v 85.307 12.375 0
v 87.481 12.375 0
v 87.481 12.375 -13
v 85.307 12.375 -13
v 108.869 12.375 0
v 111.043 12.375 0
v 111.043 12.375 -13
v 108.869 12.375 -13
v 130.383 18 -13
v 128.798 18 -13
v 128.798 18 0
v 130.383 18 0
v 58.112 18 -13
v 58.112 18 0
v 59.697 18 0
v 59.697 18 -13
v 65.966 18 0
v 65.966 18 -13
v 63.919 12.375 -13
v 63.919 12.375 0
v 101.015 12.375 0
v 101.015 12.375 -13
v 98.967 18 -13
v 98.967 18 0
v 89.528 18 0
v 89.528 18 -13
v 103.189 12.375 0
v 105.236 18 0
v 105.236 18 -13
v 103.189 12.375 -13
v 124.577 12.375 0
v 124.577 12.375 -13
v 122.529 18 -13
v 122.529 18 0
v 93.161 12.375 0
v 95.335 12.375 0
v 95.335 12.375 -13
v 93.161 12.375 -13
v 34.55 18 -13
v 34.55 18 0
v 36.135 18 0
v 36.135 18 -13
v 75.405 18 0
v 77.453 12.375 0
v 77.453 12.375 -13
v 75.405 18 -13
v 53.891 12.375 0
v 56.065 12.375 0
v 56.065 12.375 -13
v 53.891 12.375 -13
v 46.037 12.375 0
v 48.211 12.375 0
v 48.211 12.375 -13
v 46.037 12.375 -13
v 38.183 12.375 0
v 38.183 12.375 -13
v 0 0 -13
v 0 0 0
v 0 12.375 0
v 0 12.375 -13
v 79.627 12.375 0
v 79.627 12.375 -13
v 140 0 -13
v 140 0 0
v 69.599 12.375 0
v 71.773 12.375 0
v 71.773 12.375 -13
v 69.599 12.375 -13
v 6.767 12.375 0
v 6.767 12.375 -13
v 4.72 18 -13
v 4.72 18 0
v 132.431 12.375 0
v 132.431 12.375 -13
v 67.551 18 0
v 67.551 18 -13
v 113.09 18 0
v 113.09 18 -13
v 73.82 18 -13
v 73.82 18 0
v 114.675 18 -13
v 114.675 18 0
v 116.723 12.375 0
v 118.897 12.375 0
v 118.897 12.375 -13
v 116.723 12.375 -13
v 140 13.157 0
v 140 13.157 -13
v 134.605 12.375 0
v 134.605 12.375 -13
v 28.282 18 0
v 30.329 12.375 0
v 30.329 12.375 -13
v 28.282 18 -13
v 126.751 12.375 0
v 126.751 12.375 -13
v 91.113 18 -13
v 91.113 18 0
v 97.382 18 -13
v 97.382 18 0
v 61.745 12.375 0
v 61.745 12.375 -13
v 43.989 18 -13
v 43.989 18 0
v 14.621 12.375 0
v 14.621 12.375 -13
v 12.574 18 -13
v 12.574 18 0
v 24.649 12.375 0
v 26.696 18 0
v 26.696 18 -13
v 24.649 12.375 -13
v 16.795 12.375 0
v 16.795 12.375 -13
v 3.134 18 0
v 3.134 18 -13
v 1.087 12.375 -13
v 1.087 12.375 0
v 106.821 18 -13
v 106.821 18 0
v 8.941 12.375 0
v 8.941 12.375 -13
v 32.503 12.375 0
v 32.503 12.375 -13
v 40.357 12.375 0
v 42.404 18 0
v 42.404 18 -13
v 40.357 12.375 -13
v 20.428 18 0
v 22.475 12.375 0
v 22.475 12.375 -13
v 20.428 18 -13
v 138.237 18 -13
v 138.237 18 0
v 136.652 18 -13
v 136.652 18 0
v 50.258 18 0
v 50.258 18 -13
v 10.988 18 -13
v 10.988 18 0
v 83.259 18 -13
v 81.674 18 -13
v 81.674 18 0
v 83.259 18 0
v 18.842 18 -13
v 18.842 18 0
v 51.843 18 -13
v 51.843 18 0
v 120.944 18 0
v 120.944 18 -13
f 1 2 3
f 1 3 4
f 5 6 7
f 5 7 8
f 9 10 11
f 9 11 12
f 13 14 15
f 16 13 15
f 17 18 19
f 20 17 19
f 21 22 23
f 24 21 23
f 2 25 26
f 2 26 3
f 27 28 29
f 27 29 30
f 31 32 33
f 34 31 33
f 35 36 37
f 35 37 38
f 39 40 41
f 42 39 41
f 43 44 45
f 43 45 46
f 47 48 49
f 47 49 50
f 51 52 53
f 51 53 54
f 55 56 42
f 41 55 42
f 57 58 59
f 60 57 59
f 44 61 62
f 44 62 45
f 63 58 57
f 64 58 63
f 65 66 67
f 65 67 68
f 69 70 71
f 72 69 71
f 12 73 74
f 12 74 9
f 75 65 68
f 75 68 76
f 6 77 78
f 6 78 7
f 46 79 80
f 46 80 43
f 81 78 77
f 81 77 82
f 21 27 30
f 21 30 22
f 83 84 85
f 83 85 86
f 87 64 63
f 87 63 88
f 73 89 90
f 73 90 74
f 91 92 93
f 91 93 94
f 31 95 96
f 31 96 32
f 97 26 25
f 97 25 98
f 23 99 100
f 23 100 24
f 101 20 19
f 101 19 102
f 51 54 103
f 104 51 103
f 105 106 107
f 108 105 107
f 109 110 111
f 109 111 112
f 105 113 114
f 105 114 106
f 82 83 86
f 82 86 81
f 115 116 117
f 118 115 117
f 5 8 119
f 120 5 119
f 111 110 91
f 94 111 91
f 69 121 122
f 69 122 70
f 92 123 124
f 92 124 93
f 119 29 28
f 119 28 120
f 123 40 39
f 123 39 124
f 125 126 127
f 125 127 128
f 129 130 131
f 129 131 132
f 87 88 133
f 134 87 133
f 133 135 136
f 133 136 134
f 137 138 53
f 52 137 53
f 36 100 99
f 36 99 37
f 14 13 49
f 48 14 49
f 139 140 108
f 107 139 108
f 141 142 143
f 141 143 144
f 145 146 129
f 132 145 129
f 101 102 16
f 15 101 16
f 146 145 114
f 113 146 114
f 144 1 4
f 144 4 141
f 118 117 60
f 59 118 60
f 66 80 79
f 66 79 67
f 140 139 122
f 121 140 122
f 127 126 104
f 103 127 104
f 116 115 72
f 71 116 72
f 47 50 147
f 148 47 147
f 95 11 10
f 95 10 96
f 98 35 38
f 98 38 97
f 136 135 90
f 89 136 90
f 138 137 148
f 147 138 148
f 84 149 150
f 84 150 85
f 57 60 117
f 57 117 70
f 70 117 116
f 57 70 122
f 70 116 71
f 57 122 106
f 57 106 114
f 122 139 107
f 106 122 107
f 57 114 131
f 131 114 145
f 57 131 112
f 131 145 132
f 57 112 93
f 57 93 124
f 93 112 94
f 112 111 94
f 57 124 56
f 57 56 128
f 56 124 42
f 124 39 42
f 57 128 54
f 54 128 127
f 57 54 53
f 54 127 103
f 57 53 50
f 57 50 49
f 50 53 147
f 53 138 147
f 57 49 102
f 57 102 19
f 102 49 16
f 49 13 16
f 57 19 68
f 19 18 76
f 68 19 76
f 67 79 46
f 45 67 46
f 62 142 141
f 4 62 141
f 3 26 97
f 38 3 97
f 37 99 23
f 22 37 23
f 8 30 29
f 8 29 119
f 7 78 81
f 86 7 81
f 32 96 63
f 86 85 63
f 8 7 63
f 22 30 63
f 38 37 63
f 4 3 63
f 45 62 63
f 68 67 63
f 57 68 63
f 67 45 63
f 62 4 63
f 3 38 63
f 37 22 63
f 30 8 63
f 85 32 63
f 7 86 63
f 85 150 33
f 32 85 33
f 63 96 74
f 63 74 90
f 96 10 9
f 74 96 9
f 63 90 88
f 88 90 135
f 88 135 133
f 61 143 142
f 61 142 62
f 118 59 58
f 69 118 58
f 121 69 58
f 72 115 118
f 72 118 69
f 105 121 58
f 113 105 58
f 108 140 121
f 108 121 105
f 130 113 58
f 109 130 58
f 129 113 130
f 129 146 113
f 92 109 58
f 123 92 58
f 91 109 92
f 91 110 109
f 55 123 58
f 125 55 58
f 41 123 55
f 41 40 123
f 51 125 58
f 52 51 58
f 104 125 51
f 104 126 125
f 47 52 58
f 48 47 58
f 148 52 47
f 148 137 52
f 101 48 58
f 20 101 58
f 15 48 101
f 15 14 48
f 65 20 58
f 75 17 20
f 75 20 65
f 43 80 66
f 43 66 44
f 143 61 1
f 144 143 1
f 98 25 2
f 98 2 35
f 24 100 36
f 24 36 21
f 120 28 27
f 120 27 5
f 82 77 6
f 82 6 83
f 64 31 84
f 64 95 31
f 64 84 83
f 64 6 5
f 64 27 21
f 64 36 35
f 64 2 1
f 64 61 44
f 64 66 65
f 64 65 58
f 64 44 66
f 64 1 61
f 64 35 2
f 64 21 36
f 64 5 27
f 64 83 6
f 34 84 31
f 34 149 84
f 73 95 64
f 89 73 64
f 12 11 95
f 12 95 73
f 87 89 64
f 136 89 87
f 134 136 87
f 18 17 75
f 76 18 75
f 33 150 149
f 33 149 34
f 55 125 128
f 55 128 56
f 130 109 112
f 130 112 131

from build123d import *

# Parameters (mm, degrees)
BLANKSKE_W         = 140
BLANKSKE_H         = 18
BLANK_DEPTH        = 15
TOOTHCUTSIM_DEPTH  = 142.947173272
TEETHCUTS_COUNT    = 19
TEETHCUTS_PITCH    = 7.853981625
SKETCH1_W          = 155.727496732
SKETCH1_H          = 72.883147076
CUT_EXTRUDE2_DEPTH = 2


with BuildPart() as part:
    # BlankSke → Blank (new body)
    with BuildSketch(Plane.XY):
        with Locations((70, 9)):
            Rectangle(BLANKSKE_W, BLANKSKE_H)
    extrude(amount=-BLANK_DEPTH)

    # TooCutSkeSim → ToothCutSim (cut, through all)
    with BuildSketch(Plane.XY):
        Polygon((1.087088424, 12.375), (-1.087088424, 12.375), (-3.143665836, 18.0254), (3.143665836, 18.0254), align=None)
    toothcutsim = extrude(amount=-TOOTHCUTSIM_DEPTH, mode=Mode.SUBTRACT)

    # TeethCuts: ToothCutSim ×19
    with Locations(*[(i * TEETHCUTS_PITCH, 0, 0) for i in range(1, TEETHCUTS_COUNT)]):
        add(toothcutsim, mode=Mode.SUBTRACT)

    # Sketch1 → Cut-Extrude2 (cut)
    with BuildSketch(Plane.XY.offset(-15)):
        with Locations((71.044371672, 7.444354081)):
            Rectangle(SKETCH1_W, SKETCH1_H)
    extrude(amount=CUT_EXTRUDE2_DEPTH, mode=Mode.SUBTRACT)


solid = part.part
